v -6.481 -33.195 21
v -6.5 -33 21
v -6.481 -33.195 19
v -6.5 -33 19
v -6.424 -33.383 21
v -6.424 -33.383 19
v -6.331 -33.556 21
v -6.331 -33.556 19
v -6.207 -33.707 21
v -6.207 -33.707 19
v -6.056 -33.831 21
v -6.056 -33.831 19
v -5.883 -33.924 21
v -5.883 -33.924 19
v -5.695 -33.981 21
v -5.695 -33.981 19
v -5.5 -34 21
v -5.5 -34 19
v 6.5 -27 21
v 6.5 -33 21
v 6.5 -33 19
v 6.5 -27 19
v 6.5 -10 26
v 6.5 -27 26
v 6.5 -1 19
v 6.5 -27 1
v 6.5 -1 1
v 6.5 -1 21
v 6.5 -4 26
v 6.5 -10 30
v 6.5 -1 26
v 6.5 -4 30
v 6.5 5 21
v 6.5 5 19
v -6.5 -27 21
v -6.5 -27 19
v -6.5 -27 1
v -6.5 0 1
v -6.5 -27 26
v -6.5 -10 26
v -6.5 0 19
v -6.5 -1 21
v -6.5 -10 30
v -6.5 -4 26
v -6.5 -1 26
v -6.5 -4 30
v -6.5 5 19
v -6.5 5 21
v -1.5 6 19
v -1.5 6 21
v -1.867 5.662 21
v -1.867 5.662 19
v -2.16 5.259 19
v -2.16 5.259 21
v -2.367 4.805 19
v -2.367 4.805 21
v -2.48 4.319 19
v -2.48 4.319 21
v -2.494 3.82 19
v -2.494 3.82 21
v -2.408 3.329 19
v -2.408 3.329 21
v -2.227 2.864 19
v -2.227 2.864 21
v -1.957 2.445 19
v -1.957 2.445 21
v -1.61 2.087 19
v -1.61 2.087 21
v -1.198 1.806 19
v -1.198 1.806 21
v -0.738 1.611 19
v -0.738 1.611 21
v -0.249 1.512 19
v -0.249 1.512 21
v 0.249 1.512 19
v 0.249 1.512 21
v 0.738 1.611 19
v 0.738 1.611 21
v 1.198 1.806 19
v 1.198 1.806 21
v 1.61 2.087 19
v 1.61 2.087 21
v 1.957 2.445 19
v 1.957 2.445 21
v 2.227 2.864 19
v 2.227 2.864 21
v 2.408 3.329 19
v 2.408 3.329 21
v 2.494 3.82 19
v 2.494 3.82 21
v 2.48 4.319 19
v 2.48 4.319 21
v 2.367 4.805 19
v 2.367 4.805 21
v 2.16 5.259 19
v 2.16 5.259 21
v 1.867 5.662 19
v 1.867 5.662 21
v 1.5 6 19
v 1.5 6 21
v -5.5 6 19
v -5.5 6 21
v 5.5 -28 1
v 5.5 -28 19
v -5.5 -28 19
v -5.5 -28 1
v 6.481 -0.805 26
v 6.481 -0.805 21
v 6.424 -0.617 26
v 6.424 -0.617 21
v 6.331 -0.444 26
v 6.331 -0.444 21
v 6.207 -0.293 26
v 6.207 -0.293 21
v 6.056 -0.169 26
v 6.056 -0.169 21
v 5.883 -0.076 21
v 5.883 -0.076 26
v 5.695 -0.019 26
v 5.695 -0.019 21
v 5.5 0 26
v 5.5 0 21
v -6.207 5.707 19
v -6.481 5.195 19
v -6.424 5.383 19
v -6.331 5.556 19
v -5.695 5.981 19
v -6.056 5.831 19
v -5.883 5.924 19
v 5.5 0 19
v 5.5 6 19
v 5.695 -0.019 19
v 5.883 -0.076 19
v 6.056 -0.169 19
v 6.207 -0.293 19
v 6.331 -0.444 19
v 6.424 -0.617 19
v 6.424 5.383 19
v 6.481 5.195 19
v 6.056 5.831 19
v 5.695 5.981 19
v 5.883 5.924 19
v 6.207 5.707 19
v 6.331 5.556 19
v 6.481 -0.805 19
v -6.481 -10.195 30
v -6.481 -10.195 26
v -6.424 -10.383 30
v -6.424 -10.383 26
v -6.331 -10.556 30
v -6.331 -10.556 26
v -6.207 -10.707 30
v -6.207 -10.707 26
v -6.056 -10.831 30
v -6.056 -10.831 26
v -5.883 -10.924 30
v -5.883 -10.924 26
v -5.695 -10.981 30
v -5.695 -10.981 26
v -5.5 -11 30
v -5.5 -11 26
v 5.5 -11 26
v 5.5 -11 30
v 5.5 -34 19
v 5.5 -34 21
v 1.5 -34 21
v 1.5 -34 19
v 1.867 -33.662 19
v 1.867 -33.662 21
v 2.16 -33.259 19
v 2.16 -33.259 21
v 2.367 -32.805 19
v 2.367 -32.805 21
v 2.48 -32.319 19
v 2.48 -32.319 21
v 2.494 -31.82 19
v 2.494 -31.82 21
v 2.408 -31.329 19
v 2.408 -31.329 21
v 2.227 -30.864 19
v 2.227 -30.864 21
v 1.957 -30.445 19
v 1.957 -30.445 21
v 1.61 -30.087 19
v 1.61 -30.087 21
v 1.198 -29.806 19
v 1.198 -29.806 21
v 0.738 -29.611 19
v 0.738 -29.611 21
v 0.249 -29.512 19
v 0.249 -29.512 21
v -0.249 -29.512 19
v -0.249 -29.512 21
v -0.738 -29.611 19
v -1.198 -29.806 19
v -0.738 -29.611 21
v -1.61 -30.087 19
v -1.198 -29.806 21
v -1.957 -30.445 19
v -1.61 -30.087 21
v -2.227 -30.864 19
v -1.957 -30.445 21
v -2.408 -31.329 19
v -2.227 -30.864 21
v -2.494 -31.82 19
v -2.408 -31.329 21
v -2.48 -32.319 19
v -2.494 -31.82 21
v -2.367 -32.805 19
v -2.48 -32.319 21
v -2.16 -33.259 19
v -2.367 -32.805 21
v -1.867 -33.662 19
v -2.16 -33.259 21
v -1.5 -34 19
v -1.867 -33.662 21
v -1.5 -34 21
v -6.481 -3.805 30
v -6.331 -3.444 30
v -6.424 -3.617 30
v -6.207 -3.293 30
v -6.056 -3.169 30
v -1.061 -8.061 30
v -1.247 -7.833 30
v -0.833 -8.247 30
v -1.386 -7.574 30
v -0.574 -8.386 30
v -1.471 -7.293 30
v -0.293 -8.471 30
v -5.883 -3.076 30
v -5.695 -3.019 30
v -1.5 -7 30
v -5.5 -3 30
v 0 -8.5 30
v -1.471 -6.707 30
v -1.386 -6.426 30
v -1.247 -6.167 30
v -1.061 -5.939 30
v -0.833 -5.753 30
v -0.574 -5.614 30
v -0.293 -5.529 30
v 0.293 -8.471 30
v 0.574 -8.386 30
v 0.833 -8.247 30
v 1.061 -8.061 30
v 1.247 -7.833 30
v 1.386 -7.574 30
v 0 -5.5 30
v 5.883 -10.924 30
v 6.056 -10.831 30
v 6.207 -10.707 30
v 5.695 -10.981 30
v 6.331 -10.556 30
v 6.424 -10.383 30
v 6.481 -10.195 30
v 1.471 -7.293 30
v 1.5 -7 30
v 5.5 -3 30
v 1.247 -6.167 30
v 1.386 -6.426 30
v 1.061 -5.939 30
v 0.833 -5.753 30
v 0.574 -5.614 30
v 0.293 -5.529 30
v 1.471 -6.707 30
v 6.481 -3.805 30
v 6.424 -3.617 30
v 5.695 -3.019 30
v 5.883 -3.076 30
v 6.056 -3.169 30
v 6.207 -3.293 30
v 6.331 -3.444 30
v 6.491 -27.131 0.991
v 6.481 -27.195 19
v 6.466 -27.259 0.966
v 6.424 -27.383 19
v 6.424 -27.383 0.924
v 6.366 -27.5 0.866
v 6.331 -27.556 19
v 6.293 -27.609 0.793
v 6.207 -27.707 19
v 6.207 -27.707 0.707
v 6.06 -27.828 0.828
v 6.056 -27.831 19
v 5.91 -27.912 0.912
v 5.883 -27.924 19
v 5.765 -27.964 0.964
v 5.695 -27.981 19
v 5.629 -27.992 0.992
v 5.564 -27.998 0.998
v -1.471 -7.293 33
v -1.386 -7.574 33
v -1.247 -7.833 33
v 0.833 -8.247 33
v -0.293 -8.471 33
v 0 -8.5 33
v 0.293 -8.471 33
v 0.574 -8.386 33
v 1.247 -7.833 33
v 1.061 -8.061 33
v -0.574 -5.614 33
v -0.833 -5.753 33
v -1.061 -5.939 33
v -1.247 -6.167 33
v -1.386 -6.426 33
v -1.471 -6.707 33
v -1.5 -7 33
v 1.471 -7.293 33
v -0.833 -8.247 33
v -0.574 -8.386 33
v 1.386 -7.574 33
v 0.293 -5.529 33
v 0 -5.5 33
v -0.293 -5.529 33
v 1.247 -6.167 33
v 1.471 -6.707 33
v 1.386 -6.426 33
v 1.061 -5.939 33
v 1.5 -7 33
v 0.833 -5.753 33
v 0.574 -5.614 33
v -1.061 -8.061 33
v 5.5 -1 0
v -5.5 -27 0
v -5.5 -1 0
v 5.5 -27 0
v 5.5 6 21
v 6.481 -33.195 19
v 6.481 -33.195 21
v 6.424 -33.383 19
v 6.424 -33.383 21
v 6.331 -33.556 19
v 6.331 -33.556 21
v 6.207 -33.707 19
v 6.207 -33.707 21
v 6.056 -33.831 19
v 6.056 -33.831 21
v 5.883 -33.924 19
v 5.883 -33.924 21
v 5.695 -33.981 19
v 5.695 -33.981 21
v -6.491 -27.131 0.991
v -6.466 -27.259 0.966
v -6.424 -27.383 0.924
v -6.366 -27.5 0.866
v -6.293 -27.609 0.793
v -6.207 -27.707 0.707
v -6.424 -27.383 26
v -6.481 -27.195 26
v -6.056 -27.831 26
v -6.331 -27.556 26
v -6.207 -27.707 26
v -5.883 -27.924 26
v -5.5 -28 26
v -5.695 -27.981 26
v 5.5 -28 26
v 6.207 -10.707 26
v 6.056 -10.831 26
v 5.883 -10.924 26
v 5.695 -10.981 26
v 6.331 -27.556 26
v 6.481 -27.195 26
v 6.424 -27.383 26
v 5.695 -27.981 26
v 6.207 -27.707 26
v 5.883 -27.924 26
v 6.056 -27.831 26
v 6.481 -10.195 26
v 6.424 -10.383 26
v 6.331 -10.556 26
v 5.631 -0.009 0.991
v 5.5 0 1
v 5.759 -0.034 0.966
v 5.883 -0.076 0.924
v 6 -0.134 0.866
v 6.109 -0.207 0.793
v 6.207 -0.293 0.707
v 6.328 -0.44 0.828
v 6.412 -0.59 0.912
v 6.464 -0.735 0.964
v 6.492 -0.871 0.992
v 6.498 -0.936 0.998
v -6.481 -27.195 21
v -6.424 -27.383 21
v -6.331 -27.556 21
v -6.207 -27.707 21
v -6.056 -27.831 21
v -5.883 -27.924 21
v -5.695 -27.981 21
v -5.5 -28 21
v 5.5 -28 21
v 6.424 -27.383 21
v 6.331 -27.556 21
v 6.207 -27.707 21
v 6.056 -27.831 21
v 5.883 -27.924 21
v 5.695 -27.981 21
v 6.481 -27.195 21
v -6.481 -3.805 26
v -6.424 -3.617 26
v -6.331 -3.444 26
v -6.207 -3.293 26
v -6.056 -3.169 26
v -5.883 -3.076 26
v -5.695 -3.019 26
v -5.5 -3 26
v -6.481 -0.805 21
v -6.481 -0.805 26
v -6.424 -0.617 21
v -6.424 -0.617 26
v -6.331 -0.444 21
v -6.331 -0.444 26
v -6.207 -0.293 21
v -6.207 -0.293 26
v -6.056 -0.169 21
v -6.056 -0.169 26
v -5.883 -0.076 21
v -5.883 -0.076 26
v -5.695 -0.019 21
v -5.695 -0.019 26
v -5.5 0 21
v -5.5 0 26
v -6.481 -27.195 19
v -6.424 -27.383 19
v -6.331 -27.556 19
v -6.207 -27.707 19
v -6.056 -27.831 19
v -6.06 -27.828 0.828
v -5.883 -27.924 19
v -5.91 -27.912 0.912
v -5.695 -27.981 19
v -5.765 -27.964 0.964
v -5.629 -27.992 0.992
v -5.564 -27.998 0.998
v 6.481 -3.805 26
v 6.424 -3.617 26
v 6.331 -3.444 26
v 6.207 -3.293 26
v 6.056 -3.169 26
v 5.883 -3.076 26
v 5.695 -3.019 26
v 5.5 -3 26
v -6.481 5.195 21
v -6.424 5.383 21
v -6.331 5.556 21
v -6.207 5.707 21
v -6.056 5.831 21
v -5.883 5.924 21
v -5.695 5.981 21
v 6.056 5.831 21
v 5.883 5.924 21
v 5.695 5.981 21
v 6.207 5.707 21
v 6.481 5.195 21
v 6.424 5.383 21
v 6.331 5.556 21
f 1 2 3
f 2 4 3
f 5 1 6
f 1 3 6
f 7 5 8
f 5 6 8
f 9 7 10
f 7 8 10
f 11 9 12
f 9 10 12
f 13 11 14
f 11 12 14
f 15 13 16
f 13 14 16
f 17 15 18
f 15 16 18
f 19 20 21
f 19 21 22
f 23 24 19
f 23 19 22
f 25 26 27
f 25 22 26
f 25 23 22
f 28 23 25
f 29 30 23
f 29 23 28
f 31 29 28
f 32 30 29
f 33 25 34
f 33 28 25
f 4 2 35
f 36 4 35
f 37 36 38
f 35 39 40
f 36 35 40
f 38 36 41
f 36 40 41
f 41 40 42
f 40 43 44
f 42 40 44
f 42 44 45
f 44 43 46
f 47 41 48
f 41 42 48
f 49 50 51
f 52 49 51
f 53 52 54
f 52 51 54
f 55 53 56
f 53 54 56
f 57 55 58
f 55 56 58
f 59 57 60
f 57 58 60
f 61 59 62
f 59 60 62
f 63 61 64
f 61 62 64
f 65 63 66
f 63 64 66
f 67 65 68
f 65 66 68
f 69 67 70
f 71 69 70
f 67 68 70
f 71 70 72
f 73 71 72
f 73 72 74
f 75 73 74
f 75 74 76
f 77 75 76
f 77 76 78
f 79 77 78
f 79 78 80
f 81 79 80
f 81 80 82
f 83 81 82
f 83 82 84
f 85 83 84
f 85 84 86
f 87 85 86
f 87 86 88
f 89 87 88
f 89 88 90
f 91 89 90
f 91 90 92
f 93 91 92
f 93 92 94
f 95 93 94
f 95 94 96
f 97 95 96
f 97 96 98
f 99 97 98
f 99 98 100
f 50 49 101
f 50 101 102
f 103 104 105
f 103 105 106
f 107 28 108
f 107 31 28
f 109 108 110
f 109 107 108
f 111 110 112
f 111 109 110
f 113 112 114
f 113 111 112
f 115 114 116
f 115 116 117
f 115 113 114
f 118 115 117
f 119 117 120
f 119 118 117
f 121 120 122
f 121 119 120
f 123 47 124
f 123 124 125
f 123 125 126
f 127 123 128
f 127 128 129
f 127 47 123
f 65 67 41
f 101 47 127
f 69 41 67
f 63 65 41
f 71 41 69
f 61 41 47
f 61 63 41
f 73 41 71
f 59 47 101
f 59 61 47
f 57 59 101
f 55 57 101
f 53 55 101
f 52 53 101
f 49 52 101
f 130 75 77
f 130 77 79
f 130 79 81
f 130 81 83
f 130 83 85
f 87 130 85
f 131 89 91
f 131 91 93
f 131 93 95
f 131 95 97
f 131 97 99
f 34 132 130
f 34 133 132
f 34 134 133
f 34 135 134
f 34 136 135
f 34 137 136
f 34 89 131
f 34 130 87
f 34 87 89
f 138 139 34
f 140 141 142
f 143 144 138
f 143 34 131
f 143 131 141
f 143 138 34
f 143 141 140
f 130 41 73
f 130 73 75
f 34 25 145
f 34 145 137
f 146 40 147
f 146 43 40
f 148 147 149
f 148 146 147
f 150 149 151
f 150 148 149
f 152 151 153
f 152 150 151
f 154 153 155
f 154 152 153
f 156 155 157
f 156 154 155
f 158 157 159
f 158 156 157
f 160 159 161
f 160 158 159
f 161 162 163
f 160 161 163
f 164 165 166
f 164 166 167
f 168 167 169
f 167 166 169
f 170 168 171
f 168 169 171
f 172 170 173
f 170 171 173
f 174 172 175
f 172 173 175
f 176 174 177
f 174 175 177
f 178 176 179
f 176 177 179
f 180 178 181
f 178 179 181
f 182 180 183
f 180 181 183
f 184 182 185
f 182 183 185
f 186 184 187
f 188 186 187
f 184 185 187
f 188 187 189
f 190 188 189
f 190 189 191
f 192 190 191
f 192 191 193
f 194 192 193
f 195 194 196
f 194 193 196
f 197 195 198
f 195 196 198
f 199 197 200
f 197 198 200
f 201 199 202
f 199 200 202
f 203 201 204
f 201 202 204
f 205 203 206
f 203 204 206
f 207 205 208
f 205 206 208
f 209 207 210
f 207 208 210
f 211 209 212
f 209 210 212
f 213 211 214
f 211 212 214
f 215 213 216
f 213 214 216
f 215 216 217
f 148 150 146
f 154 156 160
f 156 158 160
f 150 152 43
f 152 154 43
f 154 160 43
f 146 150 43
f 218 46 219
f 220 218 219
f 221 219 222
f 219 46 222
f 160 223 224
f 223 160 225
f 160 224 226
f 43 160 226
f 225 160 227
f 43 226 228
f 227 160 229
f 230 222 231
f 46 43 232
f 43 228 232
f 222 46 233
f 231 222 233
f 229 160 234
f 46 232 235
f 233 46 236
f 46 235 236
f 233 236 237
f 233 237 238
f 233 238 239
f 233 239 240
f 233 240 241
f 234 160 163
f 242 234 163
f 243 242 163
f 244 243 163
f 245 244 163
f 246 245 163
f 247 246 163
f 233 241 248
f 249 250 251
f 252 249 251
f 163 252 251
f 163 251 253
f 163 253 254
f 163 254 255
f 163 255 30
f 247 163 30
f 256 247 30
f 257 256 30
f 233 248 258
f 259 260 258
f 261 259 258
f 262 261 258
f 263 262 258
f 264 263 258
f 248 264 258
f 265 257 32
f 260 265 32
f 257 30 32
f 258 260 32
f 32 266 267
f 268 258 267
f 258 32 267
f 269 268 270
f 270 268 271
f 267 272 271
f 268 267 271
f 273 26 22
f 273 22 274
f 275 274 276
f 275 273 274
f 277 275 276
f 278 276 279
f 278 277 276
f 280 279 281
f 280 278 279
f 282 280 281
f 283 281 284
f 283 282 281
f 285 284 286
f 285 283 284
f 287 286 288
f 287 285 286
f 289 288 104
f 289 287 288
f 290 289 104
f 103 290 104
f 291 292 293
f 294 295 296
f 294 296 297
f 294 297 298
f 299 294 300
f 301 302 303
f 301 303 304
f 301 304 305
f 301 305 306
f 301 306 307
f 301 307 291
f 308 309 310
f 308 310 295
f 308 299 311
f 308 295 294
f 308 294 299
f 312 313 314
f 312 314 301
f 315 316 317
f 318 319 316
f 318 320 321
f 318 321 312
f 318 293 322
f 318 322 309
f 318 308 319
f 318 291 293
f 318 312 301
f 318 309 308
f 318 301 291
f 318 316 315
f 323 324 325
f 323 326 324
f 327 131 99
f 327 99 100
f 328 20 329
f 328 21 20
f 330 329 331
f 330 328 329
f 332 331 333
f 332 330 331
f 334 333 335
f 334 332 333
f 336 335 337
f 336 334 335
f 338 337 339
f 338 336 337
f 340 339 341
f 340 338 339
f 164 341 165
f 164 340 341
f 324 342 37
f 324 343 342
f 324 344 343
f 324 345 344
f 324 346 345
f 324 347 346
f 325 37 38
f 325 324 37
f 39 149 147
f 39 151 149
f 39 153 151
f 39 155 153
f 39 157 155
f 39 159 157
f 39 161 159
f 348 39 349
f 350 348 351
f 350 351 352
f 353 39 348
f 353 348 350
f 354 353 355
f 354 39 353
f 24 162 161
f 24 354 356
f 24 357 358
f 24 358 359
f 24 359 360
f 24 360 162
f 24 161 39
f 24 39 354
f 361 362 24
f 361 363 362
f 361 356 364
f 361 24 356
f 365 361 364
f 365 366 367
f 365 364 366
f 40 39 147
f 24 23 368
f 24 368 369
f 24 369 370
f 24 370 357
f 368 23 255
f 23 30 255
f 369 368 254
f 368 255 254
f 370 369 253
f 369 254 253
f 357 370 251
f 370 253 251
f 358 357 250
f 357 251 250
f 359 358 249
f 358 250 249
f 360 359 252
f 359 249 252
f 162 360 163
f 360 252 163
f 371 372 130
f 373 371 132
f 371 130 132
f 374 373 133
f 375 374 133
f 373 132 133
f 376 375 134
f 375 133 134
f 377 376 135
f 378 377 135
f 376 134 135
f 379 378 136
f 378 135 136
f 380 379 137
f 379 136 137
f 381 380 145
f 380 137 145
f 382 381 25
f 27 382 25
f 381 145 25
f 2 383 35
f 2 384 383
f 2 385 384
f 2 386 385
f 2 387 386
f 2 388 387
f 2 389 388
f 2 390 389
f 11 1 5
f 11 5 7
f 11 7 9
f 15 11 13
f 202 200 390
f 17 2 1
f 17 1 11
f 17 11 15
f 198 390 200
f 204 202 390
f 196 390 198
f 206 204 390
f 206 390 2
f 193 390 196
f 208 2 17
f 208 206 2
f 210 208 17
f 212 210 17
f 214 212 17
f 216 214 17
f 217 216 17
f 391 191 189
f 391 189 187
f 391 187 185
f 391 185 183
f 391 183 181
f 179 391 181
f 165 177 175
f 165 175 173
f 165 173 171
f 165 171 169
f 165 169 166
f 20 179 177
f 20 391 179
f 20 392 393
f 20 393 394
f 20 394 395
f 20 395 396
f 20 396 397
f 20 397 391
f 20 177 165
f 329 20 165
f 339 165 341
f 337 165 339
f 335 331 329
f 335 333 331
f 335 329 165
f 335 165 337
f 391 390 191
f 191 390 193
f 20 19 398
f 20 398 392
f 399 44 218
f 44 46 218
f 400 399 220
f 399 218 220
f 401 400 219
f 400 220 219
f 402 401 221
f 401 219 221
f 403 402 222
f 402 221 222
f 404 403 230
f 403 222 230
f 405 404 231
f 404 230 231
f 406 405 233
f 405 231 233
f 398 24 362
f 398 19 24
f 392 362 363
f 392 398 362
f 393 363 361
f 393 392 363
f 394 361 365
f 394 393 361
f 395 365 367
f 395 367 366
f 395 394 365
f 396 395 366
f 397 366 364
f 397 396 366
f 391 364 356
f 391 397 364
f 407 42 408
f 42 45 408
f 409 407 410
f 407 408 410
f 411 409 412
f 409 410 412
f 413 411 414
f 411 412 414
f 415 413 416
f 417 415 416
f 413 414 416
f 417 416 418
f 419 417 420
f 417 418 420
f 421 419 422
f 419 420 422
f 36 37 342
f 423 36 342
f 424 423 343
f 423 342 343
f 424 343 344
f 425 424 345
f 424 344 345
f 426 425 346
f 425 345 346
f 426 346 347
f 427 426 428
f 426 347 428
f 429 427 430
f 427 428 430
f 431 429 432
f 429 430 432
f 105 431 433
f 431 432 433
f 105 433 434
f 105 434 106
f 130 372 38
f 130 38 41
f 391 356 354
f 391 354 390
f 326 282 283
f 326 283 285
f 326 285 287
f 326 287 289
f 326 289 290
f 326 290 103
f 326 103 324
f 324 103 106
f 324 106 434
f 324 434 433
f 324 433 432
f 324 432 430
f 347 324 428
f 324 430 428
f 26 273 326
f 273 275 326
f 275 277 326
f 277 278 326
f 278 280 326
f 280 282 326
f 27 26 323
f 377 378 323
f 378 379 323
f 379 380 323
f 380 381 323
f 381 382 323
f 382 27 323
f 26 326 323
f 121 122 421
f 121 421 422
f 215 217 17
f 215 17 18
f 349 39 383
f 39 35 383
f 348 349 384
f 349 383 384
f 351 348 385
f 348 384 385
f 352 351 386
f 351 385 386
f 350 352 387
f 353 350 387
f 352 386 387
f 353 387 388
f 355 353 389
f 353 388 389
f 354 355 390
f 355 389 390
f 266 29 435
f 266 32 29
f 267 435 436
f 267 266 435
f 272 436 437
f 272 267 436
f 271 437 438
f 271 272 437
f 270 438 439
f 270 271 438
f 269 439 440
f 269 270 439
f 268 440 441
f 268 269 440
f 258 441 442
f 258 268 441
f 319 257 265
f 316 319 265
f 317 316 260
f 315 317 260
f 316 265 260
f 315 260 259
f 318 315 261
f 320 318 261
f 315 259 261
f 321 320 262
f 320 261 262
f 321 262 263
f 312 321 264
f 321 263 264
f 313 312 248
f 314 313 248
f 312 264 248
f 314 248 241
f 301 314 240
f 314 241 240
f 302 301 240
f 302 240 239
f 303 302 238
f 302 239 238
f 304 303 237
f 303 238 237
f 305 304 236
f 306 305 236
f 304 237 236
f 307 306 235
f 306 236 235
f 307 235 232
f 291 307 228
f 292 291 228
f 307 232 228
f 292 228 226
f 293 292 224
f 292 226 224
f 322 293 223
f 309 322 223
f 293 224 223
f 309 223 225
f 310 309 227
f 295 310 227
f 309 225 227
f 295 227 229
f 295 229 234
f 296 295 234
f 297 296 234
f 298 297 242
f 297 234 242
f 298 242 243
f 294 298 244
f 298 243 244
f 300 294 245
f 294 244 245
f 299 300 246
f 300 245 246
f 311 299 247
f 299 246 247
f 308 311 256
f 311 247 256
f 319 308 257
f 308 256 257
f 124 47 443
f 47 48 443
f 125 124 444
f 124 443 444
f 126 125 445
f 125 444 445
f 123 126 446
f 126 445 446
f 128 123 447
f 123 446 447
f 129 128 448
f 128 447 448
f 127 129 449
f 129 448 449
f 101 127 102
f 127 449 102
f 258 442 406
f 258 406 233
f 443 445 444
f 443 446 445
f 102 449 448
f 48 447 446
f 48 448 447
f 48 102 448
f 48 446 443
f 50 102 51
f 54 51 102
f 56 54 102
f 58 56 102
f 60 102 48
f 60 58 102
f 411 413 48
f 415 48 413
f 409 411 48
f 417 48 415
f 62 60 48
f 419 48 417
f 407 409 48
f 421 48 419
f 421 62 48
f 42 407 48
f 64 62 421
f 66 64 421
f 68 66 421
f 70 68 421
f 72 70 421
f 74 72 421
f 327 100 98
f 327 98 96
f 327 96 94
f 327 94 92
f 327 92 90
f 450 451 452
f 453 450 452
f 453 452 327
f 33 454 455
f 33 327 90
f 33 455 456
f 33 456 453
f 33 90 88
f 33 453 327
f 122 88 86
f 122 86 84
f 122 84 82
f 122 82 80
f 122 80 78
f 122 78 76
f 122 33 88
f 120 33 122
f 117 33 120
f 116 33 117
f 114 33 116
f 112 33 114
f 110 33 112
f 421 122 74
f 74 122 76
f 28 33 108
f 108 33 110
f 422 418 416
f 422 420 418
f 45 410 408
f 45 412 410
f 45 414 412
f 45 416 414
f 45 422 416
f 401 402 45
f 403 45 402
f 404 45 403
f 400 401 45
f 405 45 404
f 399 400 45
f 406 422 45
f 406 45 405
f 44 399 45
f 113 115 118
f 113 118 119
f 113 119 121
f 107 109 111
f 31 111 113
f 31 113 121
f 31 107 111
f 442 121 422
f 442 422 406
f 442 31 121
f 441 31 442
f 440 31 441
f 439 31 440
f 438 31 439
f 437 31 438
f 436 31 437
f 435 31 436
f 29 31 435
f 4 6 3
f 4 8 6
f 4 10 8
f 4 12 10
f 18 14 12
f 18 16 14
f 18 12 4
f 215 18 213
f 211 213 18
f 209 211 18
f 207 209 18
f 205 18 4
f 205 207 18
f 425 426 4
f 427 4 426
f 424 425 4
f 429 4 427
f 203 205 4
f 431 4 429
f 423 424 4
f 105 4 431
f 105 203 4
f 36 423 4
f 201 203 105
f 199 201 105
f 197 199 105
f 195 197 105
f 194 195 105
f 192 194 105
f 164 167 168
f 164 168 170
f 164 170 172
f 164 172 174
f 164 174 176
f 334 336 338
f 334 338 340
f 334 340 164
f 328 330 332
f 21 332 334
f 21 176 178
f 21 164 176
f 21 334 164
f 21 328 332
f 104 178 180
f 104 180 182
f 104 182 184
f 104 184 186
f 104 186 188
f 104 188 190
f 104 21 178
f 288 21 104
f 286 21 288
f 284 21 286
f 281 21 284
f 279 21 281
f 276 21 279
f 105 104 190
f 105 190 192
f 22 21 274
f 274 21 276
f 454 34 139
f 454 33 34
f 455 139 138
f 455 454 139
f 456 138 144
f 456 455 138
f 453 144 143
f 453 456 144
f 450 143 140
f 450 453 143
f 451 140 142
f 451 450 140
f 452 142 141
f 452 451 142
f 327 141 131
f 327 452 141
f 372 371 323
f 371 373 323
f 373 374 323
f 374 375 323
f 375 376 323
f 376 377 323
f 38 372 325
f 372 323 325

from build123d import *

# Parameters (mm, degrees)
F0_W     = 8
F0_H     = 4
F1_DEPTH = 6.5
F2_R     = 1.5
F3_DEPTH = 3
F4_SIZE  = 1
F5_R     = 1
F6_R     = 2.5
F7_DEPTH = 25


with BuildPart() as f1:
    # F0 (on Right) → F1 (new body, symmetric)
    with BuildSketch(Plane.YZ):
        Polygon((0, 0), (0, 19), (6, 19), (6, 21), (0, 21), (0, 26), (-3, 26), (-11, 26), (-28, 26), (-28, 21), (-34, 21), (-34, 19), (-28, 19), (-28, 0), align=None)
        with Locations((-7, 28)):
            Rectangle(F0_W, F0_H)
    extrude(amount=F1_DEPTH, both=True)

    # F2 (on face) → F3 (join)
    with BuildSketch(Plane.XY.offset(30)):
        with Locations((0, -7)):
            Circle(F2_R)
    extrude(amount=F3_DEPTH)

    # F4
    f4_edges = [f1.edges().sort_by_distance(p)[0] for p in [
        (-6.5, -14, 0),
        (0, 0, 0),
        (6.5, -14, 0),
        (0, -28, 0),
    ]]
    chamfer(f4_edges, length=F4_SIZE)

    # F5
    f5_edges = [f1.edges().sort_by_distance(p)[0] for p in [
        (6.5, 0, 10),
        (6.5, 0, 23.5),
        (-6.5, 0, 23.5),
        (6.5, -3, 28),
        (6.5, -11, 28),
        (-6.5, -11, 28),
        (-6.5, -3, 28),
        (6.5, -28, 23.5),
        (-6.5, -28, 23.5),
        (6.5, -34, 20),
        (-6.5, -34, 20),
        (6.5, -28, 10),
        (-6.5, -28, 10),
        (6.5, 6, 20),
        (-6.5, 6, 20),
    ]]
    fillet(f5_edges, radius=F5_R)

    # F6 (on face) → F7 (cut)
    with BuildSketch(Plane.XY.offset(21)):
        with Locations((0, 4)):
            Circle(F6_R)
        with Locations((0, -32)):
            Circle(F6_R)
    extrude(amount=-F7_DEPTH, mode=Mode.SUBTRACT)


solid = f1.part
